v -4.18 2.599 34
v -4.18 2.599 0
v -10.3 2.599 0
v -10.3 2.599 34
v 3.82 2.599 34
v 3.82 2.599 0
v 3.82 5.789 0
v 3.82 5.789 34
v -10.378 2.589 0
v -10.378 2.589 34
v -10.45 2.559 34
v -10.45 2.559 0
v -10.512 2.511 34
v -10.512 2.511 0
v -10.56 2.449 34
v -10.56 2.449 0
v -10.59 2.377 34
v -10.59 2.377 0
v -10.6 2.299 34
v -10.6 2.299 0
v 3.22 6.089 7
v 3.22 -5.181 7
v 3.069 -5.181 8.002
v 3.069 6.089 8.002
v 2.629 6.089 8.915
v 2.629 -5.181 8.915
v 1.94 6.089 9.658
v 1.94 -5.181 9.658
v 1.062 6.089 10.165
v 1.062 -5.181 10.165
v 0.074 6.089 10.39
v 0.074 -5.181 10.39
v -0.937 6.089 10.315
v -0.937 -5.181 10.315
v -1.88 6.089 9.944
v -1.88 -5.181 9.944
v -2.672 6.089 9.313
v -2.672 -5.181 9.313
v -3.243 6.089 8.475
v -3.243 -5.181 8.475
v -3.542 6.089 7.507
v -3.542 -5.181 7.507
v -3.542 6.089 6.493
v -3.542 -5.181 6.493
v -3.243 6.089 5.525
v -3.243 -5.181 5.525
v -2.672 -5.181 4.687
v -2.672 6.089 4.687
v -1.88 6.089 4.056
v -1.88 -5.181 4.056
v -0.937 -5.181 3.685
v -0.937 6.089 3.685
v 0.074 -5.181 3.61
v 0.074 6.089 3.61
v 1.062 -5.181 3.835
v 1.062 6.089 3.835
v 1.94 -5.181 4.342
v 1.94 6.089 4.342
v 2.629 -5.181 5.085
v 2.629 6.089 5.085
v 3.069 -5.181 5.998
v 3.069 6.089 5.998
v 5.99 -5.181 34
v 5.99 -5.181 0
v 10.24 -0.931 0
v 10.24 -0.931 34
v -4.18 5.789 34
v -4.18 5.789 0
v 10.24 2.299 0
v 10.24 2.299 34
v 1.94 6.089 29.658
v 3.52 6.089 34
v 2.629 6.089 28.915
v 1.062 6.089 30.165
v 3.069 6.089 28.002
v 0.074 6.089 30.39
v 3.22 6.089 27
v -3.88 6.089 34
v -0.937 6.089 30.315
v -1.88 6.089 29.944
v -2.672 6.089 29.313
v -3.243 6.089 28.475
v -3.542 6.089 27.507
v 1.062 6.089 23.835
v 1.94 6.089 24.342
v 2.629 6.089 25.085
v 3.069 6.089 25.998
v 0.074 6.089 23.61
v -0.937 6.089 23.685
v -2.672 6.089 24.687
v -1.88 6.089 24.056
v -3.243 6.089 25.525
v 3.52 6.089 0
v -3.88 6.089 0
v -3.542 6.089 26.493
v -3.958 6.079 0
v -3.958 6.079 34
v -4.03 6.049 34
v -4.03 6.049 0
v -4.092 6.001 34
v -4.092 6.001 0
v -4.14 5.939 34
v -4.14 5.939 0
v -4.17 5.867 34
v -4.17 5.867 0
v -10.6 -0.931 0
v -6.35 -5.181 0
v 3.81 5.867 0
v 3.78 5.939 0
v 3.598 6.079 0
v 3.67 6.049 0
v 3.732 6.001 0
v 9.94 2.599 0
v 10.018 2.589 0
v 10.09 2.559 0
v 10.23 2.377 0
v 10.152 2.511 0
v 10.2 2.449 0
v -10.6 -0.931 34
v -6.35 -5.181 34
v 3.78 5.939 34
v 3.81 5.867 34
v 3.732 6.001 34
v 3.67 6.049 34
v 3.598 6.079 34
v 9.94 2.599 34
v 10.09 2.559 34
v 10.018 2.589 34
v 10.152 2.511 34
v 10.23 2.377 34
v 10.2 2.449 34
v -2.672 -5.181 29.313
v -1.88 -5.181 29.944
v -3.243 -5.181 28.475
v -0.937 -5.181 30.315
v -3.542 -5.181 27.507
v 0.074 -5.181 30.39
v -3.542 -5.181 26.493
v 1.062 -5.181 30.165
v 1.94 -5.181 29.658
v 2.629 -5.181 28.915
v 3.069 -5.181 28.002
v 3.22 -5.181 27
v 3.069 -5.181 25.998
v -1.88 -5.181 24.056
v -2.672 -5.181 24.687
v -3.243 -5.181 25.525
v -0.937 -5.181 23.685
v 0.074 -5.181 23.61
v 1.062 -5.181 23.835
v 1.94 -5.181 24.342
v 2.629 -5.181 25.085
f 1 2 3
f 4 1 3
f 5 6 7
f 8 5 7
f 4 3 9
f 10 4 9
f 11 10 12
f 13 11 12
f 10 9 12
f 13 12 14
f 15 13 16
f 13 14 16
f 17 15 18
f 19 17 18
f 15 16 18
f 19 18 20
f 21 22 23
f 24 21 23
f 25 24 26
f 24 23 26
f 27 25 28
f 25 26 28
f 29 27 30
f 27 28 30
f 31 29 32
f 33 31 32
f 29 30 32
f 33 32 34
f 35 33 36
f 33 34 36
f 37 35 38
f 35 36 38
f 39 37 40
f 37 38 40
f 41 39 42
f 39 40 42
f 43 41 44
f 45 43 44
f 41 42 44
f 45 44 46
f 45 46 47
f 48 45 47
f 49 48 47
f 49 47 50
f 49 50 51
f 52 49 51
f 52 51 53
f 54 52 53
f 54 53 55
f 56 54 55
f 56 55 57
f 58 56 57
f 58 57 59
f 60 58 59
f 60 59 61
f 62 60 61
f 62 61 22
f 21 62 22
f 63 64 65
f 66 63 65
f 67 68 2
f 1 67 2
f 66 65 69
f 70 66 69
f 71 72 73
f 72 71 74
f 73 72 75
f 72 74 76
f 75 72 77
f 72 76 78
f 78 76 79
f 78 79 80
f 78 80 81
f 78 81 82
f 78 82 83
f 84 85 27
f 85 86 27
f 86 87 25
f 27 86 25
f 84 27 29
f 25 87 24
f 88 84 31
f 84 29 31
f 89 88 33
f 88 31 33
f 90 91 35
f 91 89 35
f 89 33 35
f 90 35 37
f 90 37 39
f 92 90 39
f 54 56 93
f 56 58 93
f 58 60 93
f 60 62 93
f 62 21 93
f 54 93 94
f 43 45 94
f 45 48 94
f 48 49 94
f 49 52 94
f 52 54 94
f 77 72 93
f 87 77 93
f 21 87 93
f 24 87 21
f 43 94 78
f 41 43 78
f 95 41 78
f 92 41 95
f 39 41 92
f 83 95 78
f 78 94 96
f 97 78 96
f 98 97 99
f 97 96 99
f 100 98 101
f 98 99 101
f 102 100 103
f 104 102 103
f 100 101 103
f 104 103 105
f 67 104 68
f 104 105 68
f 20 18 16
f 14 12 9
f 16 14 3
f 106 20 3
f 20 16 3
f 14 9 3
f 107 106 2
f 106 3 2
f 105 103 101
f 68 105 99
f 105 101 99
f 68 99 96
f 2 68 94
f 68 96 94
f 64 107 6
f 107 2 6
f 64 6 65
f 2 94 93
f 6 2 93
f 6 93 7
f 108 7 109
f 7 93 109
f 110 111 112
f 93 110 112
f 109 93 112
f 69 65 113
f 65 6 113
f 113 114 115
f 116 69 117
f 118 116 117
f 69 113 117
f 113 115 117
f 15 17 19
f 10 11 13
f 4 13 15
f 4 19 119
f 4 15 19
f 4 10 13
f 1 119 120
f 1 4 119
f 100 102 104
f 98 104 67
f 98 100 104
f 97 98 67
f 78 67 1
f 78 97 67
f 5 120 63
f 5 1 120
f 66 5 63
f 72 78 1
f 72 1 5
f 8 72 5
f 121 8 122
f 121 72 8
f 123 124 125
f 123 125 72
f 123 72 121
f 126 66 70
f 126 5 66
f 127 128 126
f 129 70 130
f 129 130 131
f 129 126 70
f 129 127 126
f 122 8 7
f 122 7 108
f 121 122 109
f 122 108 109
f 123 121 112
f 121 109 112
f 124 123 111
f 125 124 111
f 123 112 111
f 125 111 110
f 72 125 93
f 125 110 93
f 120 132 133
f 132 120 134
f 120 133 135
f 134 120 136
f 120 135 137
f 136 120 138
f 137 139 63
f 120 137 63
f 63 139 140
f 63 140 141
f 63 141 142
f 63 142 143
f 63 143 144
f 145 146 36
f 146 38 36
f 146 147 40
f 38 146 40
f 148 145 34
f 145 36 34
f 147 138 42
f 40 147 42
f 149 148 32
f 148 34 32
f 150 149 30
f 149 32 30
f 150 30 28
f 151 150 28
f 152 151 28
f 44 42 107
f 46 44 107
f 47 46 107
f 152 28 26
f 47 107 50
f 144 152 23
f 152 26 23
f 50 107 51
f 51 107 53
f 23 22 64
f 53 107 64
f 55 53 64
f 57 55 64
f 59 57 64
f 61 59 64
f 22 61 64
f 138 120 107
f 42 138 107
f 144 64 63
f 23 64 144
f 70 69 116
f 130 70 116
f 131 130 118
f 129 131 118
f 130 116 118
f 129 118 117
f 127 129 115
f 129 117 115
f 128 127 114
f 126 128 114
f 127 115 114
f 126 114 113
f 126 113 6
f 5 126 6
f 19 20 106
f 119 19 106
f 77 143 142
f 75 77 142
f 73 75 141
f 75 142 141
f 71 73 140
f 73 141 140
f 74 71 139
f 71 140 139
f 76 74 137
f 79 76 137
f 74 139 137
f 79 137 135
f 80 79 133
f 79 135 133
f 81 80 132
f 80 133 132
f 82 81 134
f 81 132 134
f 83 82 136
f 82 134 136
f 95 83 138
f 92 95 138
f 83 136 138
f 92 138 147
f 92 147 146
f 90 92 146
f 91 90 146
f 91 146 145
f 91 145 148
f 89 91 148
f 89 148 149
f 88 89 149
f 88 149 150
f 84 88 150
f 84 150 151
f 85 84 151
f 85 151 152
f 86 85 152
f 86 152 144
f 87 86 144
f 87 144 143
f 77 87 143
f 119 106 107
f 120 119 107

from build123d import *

# Parameters (mm, degrees)
EXTRUDE_1_DEPTH    = 34
HOLE_WIZARD_M8_1_D = 6.8


with BuildPart() as part:
    # 草图1 → 凸台-拉伸1 (new body)
    with BuildSketch(Plane.XY):
        with BuildLine():
            Line((-6.350003001, -5.180792426), (5.989996999, -5.180792426))
            Line((5.989996999, -5.180792426), (10.239996999, -0.930792426))
            Line((10.239996999, -0.930792426), (10.239996999, 2.299207574))
            ThreePointArc((10.239996999, 2.299207574), (10.152129033, 2.511339608), (9.939996999, 2.599207574))
            Line((9.939996999, 2.599207574), (3.819996999, 2.599207574))
            Line((3.819996999, 2.599207574), (3.819996999, 5.789207574))
            ThreePointArc((3.819996999, 5.789207574), (3.732129033, 6.001339608), (3.519996999, 6.089207574))
            Line((3.519996999, 6.089207574), (-3.880003001, 6.089207574))
            ThreePointArc((-3.880003001, 6.089207574), (-4.092135036, 6.001339608), (-4.180003001, 5.789207574))
            Line((-4.180003001, 5.789207574), (-4.180003001, 2.599207574))
            Line((-4.180003001, 2.599207574), (-10.300003001, 2.599207574))
            ThreePointArc((-10.300003001, 2.599207574), (-10.512135036, 2.511339608), (-10.600003001, 2.299207574))
            Line((-10.600003001, 2.299207574), (-10.600003001, -0.930792426))
            Line((-10.600003001, -0.930792426), (-6.350003001, -5.180792426))
        make_face()
    extrude(amount=EXTRUDE_1_DEPTH)

    # M8 螺纹孔1 (through all)
    with Locations(Plane(origin=(0, 6.089207574, 0), x_dir=(-1, 0, 0), z_dir=(0, 1, 0))):
        with Locations((0.180003001, 7), (0.180003001, 27)):
            Hole(HOLE_WIZARD_M8_1_D / 2)


solid = part.part
